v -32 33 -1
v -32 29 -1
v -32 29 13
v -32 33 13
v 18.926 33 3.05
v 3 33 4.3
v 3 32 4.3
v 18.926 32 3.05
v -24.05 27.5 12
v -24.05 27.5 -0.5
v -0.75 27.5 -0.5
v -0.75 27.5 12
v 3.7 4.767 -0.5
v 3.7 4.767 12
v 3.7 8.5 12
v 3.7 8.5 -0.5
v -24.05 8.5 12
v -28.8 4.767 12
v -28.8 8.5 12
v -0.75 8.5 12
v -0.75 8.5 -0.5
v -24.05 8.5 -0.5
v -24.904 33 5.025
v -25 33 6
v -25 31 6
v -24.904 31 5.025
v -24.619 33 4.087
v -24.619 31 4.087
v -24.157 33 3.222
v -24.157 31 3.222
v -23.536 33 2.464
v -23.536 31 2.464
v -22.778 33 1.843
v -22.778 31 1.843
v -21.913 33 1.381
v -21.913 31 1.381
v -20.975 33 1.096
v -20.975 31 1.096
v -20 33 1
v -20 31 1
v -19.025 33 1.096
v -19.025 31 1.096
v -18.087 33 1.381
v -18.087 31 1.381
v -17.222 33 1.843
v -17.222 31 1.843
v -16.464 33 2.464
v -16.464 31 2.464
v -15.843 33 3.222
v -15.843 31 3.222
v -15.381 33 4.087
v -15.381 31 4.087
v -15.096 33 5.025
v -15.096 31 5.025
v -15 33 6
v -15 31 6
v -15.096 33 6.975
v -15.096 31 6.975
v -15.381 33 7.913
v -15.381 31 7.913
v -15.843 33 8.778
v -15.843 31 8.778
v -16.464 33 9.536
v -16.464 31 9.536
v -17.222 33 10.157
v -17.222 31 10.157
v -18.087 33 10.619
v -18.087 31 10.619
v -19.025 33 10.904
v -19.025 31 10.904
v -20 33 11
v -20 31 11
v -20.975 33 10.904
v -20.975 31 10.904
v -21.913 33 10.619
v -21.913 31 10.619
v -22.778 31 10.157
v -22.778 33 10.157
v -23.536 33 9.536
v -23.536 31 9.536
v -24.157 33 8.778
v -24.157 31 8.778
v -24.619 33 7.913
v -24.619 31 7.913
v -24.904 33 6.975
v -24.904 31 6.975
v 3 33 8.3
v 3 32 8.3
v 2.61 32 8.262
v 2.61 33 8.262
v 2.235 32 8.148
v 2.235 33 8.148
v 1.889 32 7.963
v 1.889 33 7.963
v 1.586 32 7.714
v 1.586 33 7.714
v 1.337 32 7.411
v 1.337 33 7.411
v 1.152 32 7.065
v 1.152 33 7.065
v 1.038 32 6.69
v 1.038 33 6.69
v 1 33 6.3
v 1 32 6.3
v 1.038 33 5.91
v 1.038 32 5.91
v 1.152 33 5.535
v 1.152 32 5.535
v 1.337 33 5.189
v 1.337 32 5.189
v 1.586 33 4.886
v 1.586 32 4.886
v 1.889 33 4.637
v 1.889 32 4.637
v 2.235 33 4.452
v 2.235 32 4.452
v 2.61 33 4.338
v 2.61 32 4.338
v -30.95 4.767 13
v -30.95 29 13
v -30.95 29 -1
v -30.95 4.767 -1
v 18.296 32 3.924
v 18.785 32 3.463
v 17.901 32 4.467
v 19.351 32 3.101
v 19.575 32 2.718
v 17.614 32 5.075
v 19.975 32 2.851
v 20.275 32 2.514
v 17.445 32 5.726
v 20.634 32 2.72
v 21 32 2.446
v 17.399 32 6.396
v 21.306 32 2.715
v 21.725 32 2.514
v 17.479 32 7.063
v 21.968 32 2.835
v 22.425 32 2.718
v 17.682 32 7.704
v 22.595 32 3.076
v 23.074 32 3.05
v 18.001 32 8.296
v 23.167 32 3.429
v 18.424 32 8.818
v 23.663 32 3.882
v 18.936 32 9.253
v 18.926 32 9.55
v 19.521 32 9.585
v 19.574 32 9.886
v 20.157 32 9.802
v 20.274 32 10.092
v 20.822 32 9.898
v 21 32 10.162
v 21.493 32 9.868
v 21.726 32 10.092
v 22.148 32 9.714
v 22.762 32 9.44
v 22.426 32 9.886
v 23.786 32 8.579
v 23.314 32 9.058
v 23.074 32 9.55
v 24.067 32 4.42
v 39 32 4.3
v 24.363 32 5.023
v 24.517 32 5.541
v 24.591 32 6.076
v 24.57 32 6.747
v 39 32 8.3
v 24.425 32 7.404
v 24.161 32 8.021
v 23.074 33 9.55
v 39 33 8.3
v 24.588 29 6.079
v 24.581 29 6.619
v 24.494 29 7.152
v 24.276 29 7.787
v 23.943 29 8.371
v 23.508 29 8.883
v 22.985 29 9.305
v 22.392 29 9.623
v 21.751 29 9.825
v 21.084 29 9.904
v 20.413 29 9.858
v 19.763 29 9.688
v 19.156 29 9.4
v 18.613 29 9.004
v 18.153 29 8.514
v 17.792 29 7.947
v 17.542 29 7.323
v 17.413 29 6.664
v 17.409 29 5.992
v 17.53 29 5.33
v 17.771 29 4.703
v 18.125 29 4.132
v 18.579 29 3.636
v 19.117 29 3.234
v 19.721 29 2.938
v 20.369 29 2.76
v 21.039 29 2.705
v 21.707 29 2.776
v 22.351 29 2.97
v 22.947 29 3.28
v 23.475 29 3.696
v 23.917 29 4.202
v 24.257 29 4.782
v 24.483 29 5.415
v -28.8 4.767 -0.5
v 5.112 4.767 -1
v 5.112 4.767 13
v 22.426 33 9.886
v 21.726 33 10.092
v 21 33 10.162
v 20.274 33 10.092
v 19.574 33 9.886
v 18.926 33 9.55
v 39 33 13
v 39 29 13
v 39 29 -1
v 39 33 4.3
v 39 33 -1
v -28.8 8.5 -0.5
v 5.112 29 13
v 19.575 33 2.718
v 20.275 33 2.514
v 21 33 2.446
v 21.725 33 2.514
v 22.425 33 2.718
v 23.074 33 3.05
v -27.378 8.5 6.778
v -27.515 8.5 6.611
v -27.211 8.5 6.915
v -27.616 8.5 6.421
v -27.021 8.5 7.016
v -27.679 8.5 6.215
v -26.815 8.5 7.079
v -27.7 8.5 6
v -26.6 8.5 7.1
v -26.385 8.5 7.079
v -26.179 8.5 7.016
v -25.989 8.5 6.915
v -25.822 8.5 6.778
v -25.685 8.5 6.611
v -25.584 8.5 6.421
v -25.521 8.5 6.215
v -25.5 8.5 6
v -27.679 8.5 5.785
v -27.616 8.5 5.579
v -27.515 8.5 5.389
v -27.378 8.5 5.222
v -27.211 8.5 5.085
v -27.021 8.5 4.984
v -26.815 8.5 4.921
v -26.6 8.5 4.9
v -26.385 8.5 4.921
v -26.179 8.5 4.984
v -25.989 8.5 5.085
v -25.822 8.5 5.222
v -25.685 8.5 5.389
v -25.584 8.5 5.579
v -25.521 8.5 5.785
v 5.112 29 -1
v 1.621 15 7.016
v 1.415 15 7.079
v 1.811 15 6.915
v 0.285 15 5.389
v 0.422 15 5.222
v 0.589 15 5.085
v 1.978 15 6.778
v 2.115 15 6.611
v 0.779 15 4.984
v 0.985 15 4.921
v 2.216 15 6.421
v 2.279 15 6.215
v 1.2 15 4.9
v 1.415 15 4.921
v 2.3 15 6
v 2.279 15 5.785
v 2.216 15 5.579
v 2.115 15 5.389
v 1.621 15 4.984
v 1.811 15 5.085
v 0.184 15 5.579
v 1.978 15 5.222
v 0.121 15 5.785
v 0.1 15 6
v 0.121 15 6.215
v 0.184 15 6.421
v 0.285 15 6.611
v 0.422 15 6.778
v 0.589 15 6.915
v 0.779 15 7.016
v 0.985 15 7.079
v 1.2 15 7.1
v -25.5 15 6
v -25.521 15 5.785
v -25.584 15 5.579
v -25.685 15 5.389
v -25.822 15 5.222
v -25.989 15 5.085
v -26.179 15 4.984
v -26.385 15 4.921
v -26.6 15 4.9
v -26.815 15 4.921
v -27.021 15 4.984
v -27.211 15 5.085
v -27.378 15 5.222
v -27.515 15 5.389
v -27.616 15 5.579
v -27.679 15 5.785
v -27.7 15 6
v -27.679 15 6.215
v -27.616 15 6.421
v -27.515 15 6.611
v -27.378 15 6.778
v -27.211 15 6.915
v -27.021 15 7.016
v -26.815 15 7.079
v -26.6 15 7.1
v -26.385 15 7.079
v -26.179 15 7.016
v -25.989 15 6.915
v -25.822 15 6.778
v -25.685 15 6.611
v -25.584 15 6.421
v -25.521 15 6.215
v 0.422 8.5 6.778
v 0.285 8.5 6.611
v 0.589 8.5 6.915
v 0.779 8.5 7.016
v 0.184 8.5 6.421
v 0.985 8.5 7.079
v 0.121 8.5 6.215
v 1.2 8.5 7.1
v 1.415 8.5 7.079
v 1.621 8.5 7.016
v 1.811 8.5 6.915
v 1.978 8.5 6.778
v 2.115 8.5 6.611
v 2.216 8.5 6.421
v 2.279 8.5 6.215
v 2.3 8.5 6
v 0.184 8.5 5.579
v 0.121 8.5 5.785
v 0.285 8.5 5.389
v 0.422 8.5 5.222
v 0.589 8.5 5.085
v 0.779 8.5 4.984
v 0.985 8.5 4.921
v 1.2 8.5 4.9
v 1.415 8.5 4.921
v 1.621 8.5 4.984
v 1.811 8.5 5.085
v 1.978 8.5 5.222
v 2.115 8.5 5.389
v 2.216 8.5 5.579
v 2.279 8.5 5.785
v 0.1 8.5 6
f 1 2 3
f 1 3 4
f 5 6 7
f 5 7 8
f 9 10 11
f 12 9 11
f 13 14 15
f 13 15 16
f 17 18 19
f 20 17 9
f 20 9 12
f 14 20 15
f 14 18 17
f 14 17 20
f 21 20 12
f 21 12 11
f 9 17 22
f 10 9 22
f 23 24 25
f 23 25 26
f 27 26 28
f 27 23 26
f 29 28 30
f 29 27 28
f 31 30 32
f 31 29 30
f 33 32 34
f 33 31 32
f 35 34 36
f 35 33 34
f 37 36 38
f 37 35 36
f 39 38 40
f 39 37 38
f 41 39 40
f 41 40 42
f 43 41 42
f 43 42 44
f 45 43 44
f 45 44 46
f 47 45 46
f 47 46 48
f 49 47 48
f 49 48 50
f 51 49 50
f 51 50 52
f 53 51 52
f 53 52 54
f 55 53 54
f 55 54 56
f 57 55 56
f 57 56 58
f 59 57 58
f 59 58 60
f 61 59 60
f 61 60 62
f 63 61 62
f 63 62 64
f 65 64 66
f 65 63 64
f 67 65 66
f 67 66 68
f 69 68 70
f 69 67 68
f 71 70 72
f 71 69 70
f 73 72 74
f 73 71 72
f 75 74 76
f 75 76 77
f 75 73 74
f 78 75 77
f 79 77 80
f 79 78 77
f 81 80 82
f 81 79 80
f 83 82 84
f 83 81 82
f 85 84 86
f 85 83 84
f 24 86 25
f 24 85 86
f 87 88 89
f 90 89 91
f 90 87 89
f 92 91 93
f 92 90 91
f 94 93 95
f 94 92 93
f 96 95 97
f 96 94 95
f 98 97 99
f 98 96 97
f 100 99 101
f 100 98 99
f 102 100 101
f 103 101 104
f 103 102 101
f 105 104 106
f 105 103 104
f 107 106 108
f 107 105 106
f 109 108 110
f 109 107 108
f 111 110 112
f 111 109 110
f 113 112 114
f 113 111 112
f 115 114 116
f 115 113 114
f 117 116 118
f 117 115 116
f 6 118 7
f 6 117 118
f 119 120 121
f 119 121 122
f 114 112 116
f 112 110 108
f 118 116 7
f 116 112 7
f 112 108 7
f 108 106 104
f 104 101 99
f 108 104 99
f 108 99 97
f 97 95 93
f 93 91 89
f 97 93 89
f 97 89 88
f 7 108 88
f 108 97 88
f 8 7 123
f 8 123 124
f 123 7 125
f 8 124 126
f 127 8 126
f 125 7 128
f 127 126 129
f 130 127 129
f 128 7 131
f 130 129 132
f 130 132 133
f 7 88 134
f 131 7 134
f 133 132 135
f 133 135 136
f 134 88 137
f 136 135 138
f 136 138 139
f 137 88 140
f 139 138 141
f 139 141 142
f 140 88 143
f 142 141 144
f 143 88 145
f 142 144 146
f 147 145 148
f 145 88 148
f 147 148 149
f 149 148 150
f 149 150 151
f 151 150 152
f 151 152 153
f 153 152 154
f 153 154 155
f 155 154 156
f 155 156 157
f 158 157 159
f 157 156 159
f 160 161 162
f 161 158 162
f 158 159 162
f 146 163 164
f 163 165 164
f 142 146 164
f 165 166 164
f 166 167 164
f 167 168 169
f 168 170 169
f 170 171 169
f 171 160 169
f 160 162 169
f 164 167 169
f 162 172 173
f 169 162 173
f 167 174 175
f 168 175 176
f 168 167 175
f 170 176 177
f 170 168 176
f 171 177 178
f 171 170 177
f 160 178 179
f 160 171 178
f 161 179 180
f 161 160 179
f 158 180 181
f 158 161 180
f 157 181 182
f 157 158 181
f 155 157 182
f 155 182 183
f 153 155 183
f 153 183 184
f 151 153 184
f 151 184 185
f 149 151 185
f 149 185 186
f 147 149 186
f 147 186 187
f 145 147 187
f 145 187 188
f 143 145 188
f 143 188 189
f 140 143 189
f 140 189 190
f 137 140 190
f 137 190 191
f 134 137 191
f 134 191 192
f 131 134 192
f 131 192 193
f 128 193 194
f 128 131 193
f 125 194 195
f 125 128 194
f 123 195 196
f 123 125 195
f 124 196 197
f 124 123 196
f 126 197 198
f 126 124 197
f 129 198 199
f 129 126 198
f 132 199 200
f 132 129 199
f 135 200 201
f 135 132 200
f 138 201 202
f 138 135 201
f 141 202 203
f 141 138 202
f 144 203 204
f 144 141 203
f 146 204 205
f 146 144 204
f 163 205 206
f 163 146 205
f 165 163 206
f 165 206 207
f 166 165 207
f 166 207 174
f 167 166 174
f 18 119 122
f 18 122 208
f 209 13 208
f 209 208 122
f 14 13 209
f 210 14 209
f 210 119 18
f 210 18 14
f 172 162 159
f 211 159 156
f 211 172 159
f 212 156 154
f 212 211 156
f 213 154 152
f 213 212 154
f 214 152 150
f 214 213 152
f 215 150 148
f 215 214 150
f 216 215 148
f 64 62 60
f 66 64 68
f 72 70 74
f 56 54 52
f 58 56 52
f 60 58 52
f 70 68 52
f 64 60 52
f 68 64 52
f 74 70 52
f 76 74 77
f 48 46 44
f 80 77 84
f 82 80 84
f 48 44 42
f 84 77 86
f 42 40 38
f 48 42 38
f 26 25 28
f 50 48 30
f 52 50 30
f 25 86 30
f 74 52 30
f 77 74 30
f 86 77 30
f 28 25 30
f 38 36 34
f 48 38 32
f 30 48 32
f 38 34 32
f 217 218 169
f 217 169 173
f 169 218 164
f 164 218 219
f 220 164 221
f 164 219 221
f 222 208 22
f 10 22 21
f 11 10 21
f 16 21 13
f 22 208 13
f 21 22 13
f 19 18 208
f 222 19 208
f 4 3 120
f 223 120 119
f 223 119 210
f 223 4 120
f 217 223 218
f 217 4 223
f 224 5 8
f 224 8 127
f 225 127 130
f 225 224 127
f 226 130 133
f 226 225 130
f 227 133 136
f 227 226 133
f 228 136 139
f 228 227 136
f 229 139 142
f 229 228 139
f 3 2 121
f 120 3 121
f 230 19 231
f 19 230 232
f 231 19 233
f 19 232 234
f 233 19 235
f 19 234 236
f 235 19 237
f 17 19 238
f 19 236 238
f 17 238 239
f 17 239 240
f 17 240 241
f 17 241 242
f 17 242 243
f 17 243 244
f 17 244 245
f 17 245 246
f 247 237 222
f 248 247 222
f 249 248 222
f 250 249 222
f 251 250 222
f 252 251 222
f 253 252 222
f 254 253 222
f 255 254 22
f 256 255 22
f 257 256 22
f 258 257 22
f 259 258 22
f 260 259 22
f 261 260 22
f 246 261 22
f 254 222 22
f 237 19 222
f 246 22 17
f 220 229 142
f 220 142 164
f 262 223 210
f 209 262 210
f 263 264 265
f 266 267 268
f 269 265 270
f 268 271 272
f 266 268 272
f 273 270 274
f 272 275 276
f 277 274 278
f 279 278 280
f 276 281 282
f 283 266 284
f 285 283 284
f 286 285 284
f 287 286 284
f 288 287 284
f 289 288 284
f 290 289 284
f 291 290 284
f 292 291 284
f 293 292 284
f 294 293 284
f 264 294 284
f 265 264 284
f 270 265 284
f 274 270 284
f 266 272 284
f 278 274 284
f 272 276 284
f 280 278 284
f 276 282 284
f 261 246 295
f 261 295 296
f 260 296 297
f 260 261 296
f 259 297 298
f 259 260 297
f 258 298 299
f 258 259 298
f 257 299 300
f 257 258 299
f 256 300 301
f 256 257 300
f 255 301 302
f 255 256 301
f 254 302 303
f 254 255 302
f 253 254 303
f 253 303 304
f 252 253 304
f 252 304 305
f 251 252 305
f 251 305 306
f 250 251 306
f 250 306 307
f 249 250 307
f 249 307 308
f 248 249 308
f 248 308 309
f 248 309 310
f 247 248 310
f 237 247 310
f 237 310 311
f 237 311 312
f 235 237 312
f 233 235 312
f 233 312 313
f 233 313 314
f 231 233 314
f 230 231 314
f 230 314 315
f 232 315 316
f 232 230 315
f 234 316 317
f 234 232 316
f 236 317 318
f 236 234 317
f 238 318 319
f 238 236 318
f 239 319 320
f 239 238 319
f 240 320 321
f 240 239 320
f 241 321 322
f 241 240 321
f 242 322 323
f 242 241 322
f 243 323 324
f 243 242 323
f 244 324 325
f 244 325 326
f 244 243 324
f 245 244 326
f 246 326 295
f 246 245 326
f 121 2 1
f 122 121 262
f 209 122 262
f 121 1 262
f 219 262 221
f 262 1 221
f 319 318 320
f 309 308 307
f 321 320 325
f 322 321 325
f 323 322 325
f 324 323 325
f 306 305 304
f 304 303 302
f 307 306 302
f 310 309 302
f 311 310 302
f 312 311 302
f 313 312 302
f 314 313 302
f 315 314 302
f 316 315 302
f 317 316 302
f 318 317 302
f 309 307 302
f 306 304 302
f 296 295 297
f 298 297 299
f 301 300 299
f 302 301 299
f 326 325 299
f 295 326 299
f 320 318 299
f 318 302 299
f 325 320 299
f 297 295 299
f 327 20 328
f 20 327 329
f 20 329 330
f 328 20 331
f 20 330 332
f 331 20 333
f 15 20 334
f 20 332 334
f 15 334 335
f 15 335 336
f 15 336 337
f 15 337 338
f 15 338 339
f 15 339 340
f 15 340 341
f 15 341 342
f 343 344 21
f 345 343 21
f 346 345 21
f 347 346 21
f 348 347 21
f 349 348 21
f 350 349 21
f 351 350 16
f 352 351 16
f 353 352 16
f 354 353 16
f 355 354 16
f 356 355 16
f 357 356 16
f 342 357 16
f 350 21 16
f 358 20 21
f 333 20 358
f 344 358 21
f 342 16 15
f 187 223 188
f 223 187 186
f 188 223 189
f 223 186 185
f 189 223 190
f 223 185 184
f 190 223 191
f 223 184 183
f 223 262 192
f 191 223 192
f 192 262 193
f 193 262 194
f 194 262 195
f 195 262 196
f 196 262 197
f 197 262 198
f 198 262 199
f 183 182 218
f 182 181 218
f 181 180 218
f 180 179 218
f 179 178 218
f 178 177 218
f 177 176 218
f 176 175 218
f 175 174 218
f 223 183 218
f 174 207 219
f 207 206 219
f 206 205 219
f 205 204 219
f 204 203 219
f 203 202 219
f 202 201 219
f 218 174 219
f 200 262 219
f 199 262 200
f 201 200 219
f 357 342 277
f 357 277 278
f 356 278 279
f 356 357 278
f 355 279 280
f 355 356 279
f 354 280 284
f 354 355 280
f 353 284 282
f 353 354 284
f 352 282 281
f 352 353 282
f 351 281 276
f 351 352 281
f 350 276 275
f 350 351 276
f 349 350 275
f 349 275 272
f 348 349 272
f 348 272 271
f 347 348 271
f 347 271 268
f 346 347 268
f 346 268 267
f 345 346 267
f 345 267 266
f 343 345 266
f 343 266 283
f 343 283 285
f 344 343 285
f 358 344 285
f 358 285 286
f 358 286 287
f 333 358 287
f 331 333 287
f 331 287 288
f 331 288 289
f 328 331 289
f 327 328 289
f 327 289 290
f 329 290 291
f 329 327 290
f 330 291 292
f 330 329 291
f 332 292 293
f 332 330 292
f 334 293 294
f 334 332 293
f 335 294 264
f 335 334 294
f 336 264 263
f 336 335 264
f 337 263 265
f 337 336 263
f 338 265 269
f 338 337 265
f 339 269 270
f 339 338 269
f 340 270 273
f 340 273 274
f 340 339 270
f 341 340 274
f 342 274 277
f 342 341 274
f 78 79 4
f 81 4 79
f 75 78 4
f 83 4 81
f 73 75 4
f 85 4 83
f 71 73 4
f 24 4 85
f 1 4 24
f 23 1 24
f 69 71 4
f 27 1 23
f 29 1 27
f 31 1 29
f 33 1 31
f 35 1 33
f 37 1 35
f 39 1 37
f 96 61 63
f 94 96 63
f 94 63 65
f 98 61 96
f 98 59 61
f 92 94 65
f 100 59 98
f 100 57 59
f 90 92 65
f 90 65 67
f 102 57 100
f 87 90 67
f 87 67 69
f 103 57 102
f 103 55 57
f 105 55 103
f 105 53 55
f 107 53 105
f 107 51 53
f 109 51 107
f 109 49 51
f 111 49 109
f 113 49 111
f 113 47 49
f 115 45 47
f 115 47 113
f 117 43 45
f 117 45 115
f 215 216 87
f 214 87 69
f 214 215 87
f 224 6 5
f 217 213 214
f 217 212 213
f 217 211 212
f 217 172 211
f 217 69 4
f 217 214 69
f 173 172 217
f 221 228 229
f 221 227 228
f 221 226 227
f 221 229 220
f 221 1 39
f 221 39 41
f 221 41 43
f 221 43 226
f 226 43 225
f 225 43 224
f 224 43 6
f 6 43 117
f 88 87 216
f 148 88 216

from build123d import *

# Parameters (mm, degrees)
CYLINDER_R                  = 1.1
CYLINDER_DEPTH              = 10
CYLINDER001_R               = 1.1
CYLINDER001_DEPTH           = 10
SKETCH002_W                 = 23.3
SKETCH002_H                 = 12.5
PAD002_DEPTH                = 19.5
SKETCH_W                    = 32.5
SKETCH_H                    = 12.5
PAD001_DEPTH                = 4.5
SKETCH001_W                 = 36.061928
SKETCH001_H                 = 25.639376
PAD_DEPTH                   = 14
CUT002_PLACEMENT_ANGLE      = 180
CYLINDER010_R               = 3.6
CYLINDER010_DEPTH           = 8
CYLINDER010_ROLL_ANGLE      = 89.941329
CYLINDER010_PITCH_ANGLE     = 3.606623
CYLINDER010_PLACEMENT_ANGLE = -0.059115
PAD013_DEPTH                = 3
CYLINDER006_R               = 5
CYLINDER006_DEPTH           = 4
BOX_W                       = 71
BOX_H                       = 4
BOX_DEPTH                   = 14


with BuildPart() as cylinder:
    # Cylinder → Cylinder (new body)
    with BuildSketch(Plane(origin=(30, 22, 6), x_dir=(1, 0, 0), z_dir=(0, -1, 0))):
        Circle(CYLINDER_R)
    extrude(amount=CYLINDER_DEPTH)


with BuildPart() as tornillossoporteservohollo:
    # Cylinder001 → Cylinder001 (new body)
    with BuildSketch(Plane(origin=(2.2, 22, 6), x_dir=(1, 0, 0), z_dir=(0, -1, 0))):
        Circle(CYLINDER001_R)
    extrude(amount=CYLINDER001_DEPTH)

    # Fusion: union Cylinder
    add(cylinder.part)


with BuildPart() as cortecuerpo:
    # Sketch002 → Pad002 (new body)
    with BuildSketch(Plane.XZ):
        with Locations((16.4, 6.25)):
            Rectangle(SKETCH002_W, SKETCH002_H)
    extrude(amount=PAD002_DEPTH)


with BuildPart() as cortecuerpo_1:
    # Body004 placement: moved
    add(cortecuerpo.part.moved(Location((0, 19, 0))))


with BuildPart() as cortetornillos:
    # Sketch → Pad001 (new body)
    with BuildSketch(Plane.XZ):
        with Locations((16.25, 6.25)):
            Rectangle(SKETCH_W, SKETCH_H)
    extrude(amount=PAD001_DEPTH)


with BuildPart() as cortetornillos_1:
    # Body003 placement: moved
    add(cortetornillos.part.moved(Location((0, 23, 0))))


with BuildPart() as soporteservocaja:
    # Sketch001 → Pad (new body)
    with BuildSketch(Plane.XY):
        with Locations((15.881367, 9.413649)):
            Rectangle(SKETCH001_W, SKETCH001_H)
    extrude(amount=PAD_DEPTH)


with BuildPart() as soporteservocaja_1:
    # Body placement: moved
    add(soporteservocaja.part.moved(Location((0, 0, -1))))

    # Cut: cut CorteTornillos
    add(cortetornillos_1.part, mode=Mode.SUBTRACT)

    # Cut001: cut CorteCuerpo
    add(cortecuerpo_1.part, mode=Mode.SUBTRACT)

    # Cut002: cut tornillosSoporteServoHollo
    add(tornillossoporteservohollo.part, mode=Mode.SUBTRACT)


with BuildPart() as soporteservocaja_2:
    # Cut002 placement: moved
    add(soporteservocaja_1.part.moved(Location((-28.8, 27, 12))).rotate(Axis((-28.8, 27, 12), (1, 0, 0)), CUT002_PLACEMENT_ANGLE))


with BuildPart() as cylinder010:
    # Cylinder010 → Cylinder010 (new body)
    with BuildSketch(Plane.XY):
        Circle(CYLINDER010_R)
    extrude(amount=CYLINDER010_DEPTH)


with BuildPart() as cylinder010_1:
    # Cylinder010 roll: moved
    add(cylinder010.part.rotate(Axis((0, 0, 0), (1, 0, 0)), CYLINDER010_ROLL_ANGLE))


with BuildPart() as cylinder010_2:
    # Cylinder010 pitch: moved
    add(cylinder010_1.part.rotate(Axis((0, 0, 0), (0, 1, 0)), CYLINDER010_PITCH_ANGLE))


with BuildPart() as cylinder010_3:
    # Cylinder010 placement: moved
    add(cylinder010_2.part.moved(Location((21, 34, 6.3))).rotate(Axis((21, 34, 6.3), (0, 0, 1)), CYLINDER010_PLACEMENT_ANGLE))


with BuildPart() as servoagarre004:
    # Sketch013 → Pad013 (new body)
    with BuildSketch(Plane.XZ):
        with BuildLine():
            ThreePointArc((-18.00002, 2), (-20, 0), (-18.00002, -2))
            Line((-18.00002, -2), (-2.073587, -3.25))
            ThreePointArc((-2.073587, -3.25), (0, -3.854383), (2.073587, -3.25))
            Line((2.073587, -3.25), (18.00002, -2))
            ThreePointArc((18.00002, -2), (20, 0), (18.00002, 2))
            Line((2.073587, 3.25), (18.00002, 2))
            ThreePointArc((2.073587, 3.25), (0, 3.862152), (-2.073587, 3.25))
            Line((-18.00002, 2), (-2.073587, 3.25))
        make_face()
    extrude(amount=PAD013_DEPTH)


with BuildPart() as servoagarre004_1:
    # Body015 placement: moved
    add(servoagarre004.part.moved(Location((21, 35, 6.3))))

    # Fusion009: union Cylinder010
    add(cylinder010_3.part)


with BuildPart() as cylinder006:
    # Cylinder006 → Cylinder006 (new body)
    with BuildSketch(Plane(origin=(-20, 35, 6), x_dir=(-1, 0, 0), z_dir=(0, -1, 0))):
        Circle(CYLINDER006_R)
    extrude(amount=CYLINDER006_DEPTH)


with BuildPart() as fusion010:
    # Box → Box (new body)
    with BuildSketch(Plane(origin=(-32, 29, -1), x_dir=(1, 0, 0), z_dir=(0, 0, 1))):
        with Locations((35.5, 2)):
            Rectangle(BOX_W, BOX_H)
    extrude(amount=BOX_DEPTH)

    # Cut011: cut Cylinder006
    add(cylinder006.part, mode=Mode.SUBTRACT)

    # Cut012: cut ServoAgarre004
    add(servoagarre004_1.part, mode=Mode.SUBTRACT)

    # Fusion010: union SoporteServoCaja
    add(soporteservocaja_2.part)


solid = fusion010.part
